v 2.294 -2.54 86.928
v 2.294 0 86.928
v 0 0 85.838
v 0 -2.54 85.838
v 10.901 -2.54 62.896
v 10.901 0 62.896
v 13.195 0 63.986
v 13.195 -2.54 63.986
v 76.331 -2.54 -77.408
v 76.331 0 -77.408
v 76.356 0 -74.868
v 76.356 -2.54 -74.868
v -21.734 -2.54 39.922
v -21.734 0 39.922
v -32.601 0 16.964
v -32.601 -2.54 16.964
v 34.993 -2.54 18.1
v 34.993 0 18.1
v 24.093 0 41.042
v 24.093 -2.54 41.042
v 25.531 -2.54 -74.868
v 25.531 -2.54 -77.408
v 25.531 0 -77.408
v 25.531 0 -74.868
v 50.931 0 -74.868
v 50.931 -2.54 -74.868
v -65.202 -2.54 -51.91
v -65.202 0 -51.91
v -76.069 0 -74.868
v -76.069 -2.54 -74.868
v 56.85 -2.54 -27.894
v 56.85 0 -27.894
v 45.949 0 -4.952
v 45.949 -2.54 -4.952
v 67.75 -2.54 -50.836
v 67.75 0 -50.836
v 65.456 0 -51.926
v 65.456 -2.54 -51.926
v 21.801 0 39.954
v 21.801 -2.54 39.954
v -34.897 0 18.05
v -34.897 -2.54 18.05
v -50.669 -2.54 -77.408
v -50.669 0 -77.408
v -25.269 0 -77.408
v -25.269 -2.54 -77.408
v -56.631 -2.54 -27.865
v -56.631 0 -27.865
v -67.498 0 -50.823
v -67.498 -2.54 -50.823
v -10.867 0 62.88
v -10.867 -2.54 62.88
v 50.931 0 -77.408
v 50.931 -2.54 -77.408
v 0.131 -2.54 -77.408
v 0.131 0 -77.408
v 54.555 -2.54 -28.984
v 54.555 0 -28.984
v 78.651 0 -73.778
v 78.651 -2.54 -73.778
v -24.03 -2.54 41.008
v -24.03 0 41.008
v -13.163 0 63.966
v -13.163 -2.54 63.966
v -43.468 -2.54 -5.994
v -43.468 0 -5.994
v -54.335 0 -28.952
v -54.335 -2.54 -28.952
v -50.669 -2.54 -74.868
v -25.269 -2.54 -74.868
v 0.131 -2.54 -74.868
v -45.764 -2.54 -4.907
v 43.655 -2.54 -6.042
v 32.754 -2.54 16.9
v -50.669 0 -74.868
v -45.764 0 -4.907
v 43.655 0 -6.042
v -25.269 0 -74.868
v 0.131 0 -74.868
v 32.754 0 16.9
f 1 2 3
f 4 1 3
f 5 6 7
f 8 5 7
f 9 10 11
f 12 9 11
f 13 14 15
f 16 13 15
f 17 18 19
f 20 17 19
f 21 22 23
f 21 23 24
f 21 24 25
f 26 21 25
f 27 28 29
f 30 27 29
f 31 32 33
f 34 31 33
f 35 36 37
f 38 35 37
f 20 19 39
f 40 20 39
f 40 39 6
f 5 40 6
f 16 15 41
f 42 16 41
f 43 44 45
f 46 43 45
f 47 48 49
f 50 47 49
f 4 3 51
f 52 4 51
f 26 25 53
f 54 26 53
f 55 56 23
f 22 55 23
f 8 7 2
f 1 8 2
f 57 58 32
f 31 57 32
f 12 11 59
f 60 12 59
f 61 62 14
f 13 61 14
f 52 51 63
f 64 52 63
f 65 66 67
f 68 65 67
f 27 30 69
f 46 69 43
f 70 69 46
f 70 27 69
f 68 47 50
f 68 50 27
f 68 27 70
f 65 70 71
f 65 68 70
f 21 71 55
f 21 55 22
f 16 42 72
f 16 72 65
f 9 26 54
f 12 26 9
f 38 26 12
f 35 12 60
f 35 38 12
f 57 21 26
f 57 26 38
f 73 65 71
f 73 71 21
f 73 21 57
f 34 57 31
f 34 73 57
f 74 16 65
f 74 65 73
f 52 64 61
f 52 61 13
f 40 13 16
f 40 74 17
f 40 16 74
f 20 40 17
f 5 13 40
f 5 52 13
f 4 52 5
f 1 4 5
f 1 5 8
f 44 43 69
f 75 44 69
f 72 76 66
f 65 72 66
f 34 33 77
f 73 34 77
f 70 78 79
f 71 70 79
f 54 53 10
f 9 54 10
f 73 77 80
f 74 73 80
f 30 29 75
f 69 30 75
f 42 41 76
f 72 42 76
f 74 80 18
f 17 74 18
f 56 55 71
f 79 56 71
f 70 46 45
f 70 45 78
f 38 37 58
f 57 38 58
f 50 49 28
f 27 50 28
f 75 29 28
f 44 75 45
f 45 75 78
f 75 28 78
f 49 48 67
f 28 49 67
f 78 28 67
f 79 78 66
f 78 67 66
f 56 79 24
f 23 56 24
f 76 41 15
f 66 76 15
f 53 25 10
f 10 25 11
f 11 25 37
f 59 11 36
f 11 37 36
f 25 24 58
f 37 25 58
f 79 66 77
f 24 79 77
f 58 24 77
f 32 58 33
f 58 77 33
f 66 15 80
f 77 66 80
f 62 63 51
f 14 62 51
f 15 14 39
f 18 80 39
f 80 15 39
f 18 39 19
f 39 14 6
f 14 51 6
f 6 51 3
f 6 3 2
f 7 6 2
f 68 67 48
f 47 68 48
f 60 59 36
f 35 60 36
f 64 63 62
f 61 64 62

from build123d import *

# Parameters (mm, degrees)
F0_W     = 25.4
F0_H     = 2.54
F1_DEPTH = 2.54


with BuildPart() as f1:
    # F0 (on Front) → F1 (new body)
    with BuildSketch(Plane.XZ):
        Polygon((10.900511, 62.895621), (0, 85.837697), (-10.866994, 62.879726), (-21.733987, 39.921754), (-32.600981, 16.963783), (-43.467974, -5.994189), (-54.334968, -28.95216), (-65.201961, -51.910132), (-76.068955, -74.868103), (-50.668955, -74.868103), (-25.268955, -74.868103), (0.131045, -74.868103), (25.531045, -74.868103), (50.931045, -74.868103), (76.356445, -74.868103), (65.455934, -51.926027), (54.555423, -28.983951), (43.654912, -6.041875), (32.7544, 16.900201), (21.801022, 39.953545), align=None)
        Polygon((2.294208, 86.927748), (0, 85.837697), (10.900511, 62.895621), (13.194719, 63.985672), align=None)
        Polygon((-21.733987, 39.921754), (-10.866994, 62.879726), (-13.162791, 63.966425), (-24.029784, 41.008454), align=None)
        Polygon((24.09253, 41.042313), (21.801022, 39.953545), (32.7544, 16.900201), (34.993042, 18.100237), align=None)
        Polygon((-43.467974, -5.994189), (-32.600981, 16.963783), (-34.896778, 18.050482), (-45.763771, -4.907489), align=None)
        Polygon((45.949119, -4.951824), (43.654912, -6.041875), (54.555423, -28.983951), (56.849631, -27.8939), align=None)
        Polygon((-65.201961, -51.910132), (-54.334968, -28.95216), (-56.630765, -27.865461), (-67.497758, -50.823432), align=None)
        Polygon((67.750142, -50.835976), (65.455934, -51.926027), (76.356445, -74.868103), (78.650653, -73.778052), align=None)
        Polygon((76.331045, -77.408103), (76.356445, -74.868103), (50.931045, -74.868103), (50.931045, -77.408103), align=None)
        with Locations((-37.968955, -76.138103)):
            Rectangle(F0_W, F0_H)
        with Locations((12.831045, -76.138103)):
            Rectangle(F0_W, F0_H)
    extrude(amount=F1_DEPTH)


solid = f1.part
